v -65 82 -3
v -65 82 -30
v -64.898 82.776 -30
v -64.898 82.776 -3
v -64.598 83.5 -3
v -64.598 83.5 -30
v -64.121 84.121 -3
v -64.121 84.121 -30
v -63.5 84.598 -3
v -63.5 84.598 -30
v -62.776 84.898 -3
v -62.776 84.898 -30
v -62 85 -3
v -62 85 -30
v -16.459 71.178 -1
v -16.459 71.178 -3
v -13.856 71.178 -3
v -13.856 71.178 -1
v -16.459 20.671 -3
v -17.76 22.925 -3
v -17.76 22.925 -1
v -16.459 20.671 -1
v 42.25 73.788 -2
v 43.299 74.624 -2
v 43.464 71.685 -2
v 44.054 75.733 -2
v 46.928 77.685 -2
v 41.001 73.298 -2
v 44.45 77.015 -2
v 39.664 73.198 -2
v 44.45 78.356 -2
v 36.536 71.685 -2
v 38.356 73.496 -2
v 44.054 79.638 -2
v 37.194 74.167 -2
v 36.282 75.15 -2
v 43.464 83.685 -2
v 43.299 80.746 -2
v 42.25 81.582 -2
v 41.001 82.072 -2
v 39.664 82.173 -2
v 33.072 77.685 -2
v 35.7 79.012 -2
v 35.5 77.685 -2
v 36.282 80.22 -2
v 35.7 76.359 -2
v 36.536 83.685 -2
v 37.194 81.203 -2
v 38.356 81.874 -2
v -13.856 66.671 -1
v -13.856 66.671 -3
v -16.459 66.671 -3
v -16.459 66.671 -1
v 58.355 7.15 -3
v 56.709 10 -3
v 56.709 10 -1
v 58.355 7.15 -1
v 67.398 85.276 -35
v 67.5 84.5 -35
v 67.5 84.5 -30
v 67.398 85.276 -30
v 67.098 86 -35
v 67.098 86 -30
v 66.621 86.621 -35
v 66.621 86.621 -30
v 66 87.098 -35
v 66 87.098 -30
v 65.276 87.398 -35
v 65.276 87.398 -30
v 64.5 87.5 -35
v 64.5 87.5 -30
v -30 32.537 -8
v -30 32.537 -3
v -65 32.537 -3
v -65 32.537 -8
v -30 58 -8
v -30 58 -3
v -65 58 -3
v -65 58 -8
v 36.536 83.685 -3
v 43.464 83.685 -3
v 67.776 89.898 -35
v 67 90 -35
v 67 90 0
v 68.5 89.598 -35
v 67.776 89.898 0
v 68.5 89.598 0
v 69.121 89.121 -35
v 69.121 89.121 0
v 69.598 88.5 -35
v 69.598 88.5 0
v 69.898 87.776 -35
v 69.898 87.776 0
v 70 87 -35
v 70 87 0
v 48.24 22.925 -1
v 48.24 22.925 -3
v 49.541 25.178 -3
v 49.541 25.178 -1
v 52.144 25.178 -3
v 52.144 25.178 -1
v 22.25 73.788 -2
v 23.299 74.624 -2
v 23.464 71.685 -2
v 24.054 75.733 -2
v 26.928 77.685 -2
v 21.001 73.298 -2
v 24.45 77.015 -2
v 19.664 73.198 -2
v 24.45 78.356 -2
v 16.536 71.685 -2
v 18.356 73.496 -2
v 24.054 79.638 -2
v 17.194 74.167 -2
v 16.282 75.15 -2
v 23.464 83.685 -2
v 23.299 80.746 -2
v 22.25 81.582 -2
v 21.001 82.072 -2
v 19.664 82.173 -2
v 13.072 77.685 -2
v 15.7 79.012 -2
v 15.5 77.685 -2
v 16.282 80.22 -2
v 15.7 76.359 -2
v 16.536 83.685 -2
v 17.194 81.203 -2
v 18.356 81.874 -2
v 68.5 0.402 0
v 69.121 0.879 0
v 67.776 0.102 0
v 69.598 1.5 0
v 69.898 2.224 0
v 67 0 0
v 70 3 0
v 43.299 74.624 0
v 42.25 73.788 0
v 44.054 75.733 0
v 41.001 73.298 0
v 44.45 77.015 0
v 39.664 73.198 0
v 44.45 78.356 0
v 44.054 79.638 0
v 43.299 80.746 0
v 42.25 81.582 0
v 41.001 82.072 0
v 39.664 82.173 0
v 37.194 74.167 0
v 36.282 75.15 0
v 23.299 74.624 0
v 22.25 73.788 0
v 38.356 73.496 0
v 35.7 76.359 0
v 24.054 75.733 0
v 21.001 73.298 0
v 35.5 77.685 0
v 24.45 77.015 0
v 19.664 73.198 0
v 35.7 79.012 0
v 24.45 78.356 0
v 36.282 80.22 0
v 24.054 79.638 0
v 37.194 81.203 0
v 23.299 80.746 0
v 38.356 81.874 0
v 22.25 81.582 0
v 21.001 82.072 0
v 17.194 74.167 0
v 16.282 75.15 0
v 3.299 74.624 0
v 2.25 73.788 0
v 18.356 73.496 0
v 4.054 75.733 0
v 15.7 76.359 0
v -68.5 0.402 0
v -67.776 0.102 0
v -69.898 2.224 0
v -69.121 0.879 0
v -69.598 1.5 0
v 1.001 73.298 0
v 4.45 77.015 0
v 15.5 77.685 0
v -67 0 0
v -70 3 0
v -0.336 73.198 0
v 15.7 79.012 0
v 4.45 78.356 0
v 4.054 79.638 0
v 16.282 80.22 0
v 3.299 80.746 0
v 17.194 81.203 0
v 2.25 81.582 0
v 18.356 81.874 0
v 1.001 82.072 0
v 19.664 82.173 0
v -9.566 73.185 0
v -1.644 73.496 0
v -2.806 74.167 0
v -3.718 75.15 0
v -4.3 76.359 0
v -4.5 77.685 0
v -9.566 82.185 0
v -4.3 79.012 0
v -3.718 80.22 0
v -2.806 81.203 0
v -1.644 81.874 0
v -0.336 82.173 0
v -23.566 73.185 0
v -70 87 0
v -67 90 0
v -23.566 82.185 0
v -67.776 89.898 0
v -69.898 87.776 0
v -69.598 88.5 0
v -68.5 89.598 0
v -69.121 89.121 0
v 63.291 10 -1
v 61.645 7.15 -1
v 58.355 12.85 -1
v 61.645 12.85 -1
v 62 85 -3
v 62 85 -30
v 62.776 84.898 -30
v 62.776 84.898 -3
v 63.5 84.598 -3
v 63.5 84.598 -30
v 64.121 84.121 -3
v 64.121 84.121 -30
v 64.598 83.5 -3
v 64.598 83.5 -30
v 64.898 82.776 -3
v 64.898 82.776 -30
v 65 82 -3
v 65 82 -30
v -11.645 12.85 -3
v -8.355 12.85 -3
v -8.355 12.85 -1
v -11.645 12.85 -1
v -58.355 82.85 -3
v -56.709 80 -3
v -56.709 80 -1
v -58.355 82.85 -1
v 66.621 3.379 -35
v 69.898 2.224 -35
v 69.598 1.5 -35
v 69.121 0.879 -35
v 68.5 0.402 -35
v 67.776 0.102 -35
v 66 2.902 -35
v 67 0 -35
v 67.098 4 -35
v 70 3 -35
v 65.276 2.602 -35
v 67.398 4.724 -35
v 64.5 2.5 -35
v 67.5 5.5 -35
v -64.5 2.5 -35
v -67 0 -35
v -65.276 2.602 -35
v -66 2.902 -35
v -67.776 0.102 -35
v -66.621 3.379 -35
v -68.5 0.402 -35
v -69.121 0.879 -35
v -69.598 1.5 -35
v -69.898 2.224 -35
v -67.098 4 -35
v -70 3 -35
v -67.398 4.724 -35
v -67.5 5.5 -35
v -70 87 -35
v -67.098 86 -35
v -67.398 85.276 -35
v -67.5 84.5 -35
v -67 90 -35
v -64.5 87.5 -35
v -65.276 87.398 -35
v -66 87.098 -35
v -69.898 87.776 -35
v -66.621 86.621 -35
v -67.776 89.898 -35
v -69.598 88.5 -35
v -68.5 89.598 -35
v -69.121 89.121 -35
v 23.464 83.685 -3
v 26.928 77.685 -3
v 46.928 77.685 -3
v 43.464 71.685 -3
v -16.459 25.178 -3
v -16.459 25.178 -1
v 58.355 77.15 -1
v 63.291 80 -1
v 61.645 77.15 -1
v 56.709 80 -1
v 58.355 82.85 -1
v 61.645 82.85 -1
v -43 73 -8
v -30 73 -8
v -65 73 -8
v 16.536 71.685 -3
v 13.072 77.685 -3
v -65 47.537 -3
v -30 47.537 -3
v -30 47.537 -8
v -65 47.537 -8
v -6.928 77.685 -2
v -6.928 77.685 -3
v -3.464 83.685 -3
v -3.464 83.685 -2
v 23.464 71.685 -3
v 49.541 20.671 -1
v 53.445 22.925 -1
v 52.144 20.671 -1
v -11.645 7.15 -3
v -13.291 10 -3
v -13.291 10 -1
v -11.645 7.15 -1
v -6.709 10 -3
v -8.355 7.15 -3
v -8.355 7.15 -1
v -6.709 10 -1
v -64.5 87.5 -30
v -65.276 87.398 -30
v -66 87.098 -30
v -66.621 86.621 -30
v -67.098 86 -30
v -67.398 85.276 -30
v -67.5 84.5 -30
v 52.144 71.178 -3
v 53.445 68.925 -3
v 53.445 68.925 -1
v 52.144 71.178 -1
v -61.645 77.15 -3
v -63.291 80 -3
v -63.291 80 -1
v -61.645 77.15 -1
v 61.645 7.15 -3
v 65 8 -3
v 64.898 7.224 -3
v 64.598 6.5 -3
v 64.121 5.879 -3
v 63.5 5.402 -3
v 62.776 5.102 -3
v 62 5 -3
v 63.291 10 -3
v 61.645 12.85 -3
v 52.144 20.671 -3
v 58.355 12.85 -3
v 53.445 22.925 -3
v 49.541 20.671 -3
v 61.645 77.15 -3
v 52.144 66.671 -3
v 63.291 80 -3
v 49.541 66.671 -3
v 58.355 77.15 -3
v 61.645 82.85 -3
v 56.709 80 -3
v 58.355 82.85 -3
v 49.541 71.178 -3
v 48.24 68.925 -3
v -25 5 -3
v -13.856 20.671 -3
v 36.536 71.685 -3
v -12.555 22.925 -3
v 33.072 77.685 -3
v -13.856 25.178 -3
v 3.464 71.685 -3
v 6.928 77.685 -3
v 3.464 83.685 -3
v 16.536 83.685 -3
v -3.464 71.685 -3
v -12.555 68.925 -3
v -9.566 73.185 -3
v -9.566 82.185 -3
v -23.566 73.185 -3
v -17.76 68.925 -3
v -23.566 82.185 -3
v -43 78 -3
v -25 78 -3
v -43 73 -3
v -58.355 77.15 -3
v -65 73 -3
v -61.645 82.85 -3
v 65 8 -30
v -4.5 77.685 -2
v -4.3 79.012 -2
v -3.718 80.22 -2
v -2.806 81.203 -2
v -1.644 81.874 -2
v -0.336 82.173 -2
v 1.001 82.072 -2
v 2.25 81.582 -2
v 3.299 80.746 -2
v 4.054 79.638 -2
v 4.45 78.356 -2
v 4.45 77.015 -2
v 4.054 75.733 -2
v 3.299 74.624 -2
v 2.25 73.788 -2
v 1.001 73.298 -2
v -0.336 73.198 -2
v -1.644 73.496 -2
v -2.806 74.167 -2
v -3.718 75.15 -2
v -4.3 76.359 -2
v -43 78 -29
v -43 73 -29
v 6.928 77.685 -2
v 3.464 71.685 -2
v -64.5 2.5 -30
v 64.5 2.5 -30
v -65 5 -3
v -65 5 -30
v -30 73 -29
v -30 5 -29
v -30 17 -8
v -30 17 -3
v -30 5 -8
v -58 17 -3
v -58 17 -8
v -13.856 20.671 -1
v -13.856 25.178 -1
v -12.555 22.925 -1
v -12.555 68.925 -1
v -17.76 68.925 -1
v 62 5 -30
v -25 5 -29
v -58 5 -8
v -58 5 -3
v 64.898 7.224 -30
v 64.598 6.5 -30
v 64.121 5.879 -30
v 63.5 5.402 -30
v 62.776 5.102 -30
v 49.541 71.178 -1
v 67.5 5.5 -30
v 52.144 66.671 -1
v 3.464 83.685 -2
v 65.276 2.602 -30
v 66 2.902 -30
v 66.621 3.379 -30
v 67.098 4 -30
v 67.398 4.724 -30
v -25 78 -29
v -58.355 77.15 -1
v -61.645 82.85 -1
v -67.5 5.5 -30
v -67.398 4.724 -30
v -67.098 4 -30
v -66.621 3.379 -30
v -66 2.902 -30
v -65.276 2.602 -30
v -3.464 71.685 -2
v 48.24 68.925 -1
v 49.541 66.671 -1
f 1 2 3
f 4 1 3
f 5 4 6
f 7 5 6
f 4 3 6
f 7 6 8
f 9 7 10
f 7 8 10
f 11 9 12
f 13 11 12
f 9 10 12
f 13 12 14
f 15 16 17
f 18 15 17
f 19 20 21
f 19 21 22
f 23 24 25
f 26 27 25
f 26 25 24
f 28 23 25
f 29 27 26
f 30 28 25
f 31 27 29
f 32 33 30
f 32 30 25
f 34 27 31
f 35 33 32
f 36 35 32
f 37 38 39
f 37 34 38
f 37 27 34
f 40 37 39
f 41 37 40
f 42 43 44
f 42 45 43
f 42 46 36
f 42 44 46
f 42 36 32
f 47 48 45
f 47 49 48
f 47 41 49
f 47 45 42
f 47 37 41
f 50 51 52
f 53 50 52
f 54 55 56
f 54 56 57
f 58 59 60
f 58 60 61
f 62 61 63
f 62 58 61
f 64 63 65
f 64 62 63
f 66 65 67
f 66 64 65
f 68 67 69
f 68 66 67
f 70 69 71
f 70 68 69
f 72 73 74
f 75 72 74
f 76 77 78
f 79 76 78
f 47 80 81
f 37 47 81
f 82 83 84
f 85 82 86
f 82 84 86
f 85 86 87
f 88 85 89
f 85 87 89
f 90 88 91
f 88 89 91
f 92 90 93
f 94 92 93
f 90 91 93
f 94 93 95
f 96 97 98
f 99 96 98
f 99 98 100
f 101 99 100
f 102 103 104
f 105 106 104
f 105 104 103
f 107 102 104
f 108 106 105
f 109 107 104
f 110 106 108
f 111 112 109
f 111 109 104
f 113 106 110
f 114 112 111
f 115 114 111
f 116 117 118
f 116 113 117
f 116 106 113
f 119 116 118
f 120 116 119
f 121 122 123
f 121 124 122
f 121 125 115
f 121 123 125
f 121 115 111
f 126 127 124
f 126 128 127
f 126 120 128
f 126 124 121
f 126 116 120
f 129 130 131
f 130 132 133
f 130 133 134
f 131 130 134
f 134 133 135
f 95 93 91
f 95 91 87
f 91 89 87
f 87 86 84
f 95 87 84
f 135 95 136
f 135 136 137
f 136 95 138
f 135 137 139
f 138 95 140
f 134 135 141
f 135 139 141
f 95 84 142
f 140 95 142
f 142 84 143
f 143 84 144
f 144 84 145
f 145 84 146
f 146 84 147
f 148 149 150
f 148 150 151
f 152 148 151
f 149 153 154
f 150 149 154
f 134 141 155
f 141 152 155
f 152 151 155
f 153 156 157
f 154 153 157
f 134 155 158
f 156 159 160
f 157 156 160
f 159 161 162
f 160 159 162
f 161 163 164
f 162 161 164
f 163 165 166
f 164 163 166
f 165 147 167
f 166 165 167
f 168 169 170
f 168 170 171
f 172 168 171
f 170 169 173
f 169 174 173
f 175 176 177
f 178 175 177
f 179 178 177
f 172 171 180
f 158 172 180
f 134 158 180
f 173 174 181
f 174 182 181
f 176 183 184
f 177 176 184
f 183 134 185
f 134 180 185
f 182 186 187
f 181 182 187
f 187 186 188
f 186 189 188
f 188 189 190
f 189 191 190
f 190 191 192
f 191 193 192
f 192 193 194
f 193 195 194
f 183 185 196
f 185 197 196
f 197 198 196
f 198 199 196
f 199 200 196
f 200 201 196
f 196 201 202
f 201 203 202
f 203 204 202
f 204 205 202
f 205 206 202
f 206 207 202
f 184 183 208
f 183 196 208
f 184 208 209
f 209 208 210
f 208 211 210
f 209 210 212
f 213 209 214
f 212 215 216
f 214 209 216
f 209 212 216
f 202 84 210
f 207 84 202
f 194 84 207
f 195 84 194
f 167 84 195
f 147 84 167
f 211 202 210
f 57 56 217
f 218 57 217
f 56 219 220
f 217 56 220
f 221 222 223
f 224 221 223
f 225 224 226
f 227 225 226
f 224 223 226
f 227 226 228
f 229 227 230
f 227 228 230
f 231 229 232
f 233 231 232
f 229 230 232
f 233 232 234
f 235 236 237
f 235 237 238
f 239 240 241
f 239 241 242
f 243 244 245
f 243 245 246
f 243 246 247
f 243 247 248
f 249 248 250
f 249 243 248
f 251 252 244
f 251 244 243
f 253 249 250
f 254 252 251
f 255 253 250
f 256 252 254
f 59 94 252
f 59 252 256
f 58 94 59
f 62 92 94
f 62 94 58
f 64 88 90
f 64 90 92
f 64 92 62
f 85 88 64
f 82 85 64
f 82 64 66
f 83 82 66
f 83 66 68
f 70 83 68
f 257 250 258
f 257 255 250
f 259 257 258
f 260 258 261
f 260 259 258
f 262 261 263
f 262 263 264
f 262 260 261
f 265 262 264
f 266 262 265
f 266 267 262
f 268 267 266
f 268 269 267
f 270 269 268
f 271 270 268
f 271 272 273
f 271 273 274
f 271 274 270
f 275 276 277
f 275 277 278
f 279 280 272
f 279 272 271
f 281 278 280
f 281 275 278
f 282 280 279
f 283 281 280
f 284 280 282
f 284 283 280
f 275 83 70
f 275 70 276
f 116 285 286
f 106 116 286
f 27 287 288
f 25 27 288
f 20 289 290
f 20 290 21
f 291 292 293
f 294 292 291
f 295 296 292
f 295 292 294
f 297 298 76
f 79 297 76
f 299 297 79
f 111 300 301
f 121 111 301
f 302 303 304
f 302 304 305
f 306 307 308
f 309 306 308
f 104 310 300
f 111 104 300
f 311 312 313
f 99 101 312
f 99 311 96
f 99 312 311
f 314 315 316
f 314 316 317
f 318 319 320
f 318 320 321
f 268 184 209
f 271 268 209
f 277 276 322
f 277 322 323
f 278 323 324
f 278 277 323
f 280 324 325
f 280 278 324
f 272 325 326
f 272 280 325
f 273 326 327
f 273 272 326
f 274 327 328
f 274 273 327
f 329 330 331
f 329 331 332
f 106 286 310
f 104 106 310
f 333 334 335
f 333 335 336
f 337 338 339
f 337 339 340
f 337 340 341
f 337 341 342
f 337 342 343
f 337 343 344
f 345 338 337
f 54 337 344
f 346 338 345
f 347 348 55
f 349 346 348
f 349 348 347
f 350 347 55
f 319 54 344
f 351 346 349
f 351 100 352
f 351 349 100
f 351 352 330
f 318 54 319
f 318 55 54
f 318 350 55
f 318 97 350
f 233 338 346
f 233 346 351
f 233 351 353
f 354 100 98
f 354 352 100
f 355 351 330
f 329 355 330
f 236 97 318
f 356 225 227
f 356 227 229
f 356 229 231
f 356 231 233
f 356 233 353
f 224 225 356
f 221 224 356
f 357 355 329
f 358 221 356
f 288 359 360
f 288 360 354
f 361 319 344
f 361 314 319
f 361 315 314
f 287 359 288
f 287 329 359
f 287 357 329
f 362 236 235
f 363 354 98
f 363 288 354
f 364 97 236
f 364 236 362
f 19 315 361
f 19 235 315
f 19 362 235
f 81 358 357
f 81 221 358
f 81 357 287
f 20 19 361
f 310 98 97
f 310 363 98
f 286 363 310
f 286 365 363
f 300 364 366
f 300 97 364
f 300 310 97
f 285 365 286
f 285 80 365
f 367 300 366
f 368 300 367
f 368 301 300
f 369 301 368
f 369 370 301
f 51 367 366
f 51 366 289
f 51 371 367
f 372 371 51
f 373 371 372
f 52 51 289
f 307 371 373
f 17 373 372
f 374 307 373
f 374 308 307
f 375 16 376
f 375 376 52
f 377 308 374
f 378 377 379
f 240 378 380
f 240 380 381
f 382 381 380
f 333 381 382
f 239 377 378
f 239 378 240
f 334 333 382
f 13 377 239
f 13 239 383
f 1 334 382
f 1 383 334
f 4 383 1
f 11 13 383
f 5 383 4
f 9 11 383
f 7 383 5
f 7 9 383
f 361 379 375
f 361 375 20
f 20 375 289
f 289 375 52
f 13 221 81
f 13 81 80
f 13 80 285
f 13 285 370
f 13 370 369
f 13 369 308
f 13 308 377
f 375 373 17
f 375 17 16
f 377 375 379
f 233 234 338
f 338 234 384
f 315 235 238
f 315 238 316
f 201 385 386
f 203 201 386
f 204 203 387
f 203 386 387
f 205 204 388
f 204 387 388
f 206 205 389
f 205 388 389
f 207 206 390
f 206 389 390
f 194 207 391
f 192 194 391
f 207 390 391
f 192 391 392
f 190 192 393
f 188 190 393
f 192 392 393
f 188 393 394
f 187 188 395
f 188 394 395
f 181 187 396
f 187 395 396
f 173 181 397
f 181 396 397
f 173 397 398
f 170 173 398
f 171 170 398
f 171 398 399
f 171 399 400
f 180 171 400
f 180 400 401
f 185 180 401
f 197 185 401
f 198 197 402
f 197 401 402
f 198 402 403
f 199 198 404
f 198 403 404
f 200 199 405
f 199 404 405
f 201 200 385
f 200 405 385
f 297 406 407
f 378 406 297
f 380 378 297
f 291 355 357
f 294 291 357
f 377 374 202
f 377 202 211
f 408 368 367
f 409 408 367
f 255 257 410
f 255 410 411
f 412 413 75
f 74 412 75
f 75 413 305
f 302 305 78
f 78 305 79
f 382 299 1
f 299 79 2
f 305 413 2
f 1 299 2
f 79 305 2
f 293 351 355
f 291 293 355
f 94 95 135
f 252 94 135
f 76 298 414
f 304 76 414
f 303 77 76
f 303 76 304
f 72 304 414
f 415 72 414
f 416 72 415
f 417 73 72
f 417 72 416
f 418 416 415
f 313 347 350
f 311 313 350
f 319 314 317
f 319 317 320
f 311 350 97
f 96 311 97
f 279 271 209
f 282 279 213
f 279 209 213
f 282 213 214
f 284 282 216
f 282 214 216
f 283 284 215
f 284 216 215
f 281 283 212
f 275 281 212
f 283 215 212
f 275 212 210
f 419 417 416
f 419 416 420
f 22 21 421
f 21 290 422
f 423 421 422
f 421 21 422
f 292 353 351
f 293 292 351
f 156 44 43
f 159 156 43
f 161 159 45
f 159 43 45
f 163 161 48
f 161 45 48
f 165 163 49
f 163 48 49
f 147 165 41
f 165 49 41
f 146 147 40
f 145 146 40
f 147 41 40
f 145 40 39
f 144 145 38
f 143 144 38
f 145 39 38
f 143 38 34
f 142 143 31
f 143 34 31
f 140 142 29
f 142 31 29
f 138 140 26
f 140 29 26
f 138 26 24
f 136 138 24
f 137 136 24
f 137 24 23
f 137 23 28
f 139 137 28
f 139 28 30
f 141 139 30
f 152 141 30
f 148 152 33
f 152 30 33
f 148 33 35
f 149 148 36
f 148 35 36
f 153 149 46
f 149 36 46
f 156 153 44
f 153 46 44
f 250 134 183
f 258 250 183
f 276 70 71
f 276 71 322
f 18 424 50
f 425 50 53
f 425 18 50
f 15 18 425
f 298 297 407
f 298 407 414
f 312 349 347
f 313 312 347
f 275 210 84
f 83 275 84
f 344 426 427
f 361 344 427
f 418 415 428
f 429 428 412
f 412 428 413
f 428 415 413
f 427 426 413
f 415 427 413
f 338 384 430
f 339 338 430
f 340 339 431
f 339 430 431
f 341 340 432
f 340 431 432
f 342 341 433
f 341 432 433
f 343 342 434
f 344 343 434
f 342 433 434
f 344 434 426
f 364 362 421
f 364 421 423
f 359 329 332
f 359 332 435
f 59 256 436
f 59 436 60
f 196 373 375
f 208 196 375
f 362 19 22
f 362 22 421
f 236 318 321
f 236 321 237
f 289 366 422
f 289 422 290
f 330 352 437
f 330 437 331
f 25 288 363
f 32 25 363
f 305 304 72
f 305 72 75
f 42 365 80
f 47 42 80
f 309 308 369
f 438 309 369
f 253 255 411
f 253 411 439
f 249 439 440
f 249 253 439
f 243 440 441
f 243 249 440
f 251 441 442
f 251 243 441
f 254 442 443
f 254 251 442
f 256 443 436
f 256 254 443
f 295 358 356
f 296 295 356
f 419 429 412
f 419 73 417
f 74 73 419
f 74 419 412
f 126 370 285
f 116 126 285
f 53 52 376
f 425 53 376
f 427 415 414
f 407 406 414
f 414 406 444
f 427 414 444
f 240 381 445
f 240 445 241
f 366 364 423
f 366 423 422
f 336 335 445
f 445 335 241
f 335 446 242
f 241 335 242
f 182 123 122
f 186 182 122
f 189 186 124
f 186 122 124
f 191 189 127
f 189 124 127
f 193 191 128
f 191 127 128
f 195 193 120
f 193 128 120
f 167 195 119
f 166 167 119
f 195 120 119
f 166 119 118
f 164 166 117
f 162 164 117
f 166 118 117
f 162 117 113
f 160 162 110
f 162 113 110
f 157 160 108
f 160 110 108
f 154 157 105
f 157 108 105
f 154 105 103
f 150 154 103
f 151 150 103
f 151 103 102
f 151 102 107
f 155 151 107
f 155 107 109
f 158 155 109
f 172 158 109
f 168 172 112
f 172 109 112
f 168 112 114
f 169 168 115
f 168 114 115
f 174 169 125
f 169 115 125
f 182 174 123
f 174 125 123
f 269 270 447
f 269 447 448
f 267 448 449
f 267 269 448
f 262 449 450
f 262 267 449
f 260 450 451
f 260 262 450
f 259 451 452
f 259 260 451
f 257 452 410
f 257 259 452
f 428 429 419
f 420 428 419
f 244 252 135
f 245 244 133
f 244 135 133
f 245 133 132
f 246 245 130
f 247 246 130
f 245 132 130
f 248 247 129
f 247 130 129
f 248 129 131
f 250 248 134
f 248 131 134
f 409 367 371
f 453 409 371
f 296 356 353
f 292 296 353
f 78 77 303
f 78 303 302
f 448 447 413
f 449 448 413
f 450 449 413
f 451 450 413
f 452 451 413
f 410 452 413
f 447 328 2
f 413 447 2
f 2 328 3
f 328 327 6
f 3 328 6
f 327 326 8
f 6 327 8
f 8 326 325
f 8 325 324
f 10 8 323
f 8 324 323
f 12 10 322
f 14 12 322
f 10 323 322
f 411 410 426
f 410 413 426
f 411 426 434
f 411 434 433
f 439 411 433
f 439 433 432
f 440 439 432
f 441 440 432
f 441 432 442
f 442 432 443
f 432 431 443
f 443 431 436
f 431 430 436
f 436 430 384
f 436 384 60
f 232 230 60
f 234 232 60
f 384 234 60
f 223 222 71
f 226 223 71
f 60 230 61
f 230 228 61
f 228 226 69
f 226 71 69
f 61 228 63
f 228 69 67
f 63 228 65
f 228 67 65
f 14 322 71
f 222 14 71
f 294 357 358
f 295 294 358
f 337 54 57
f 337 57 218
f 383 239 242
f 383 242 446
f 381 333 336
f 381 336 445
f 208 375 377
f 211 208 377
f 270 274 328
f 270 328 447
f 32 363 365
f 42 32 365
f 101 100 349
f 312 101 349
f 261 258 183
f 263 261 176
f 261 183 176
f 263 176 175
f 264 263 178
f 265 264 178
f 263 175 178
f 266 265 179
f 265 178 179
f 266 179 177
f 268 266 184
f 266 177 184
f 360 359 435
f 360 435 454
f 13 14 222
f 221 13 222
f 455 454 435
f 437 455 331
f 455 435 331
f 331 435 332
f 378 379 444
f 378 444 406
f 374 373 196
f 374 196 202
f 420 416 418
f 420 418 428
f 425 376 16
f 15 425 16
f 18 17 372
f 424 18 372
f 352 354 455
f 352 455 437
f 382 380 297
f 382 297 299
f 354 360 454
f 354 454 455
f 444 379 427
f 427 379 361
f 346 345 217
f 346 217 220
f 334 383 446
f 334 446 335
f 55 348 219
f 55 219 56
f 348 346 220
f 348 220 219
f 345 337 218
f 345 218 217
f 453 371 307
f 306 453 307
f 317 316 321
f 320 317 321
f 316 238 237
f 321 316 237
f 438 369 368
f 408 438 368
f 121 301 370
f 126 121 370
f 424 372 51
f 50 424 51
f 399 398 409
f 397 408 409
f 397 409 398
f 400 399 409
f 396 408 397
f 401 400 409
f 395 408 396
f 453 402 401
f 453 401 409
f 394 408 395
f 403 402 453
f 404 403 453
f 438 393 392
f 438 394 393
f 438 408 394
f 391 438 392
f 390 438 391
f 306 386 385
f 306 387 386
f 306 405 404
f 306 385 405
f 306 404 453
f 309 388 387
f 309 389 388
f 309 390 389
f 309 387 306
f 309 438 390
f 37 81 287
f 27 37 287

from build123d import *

# Parameters (mm, degrees)
EXTRUDE_2_DEPTH     = 35
CUT_EXTRUDE_3_DEPTH = 5
CUT_EXTRUDE_4_DEPTH = 27
CUT_EXTRUDE_5_DEPTH = 2
CUT_EXTRUDE_6_DEPTH = 1
SKETCH_10_R         = 4.5
CUT_EXTRUDE_7_DEPTH = 2
SKETCH_11_W         = 35
SKETCH_11_H         = 15
SKETCH_11_W_2       = 28
SKETCH_11_H_2       = 12
EXTRUDE_3_DEPTH     = 5
EXTRUDE_5_DEPTH     = 26
SKETCH_13_W         = 14
SKETCH_13_H         = 9
CUT_EXTRUDE_8_DEPTH = 3


with BuildPart() as part:
    # 草图4 → 凸台-拉伸2 (new body)
    with BuildSketch(Plane.XY):
        with BuildLine():
            Line((67, 0), (-67, 0))
            ThreePointArc((-67, 0), (-69.121320344, 0.878679656), (-70, 3))
            Line((-70, 3), (-70, 87))
            ThreePointArc((-70, 87), (-69.121320344, 89.121320344), (-67, 90))
            Line((-67, 90), (67, 90))
            ThreePointArc((67, 90), (69.121320344, 89.121320344), (70, 87))
            Line((70, 87), (70, 3))
            ThreePointArc((70, 3), (69.121320344, 0.878679656), (67, 0))
        make_face()
    extrude(amount=-EXTRUDE_2_DEPTH)

    # 草图5 → 切除-拉伸3 (cut)
    with BuildSketch(Plane(origin=(0, 0, -35), x_dir=(-1, 0, 0), z_dir=(0, 0, -1))):
        with BuildLine():
            Line((-64.5, 87.5), (64.5, 87.5))
            ThreePointArc((64.5, 87.5), (66.621320344, 86.621320344), (67.5, 84.5))
            Line((67.5, 84.5), (67.5, 5.5))
            ThreePointArc((67.5, 5.5), (66.621320344, 3.378679656), (64.5, 2.5))
            Line((64.5, 2.5), (-64.5, 2.5))
            ThreePointArc((-64.5, 2.5), (-66.621320344, 3.378679656), (-67.5, 5.5))
            Line((-67.5, 5.5), (-67.5, 84.5))
            ThreePointArc((-67.5, 84.5), (-66.621320344, 86.621320344), (-64.5, 87.5))
        make_face()
    extrude(amount=-CUT_EXTRUDE_3_DEPTH, mode=Mode.SUBTRACT)

    # 草图7 → 切除-拉伸4 (cut)
    with BuildSketch(Plane(origin=(0, 0, -30), x_dir=(-1, 0, 0), z_dir=(0, 0, -1))):
        with BuildLine():
            Line((62, 5), (65, 5))
            Line((65, 5), (65, 8))
            Line((65, 8), (65, 82))
            ThreePointArc((65, 82), (64.121320344, 84.121320344), (62, 85))
            Line((62, 85), (-62, 85))
            ThreePointArc((-62, 85), (-64.121320344, 84.121320344), (-65, 82))
            Line((-65, 82), (-65, 8))
            ThreePointArc((-65, 8), (-64.121320344, 5.878679656), (-62, 5))
            Line((-62, 5), (62, 5))
        make_face()
    extrude(amount=-CUT_EXTRUDE_4_DEPTH, mode=Mode.SUBTRACT)

    # 草图8 → 切除-拉伸5 (cut)
    with BuildSketch(Plane(origin=(0, 0, -3), x_dir=(-1, 0, 0), z_dir=(0, 0, -1))):
        Polygon((-58.354551733, 12.85), (-56.709103466, 10), (-58.354551733, 7.15), (-61.645448267, 7.15), (-63.290896534, 10), (-61.645448267, 12.85), align=None)
        Polygon((-56.709103466, 80), (-58.354551733, 82.85), (-61.645448267, 82.85), (-63.290896534, 80), (-61.645448267, 77.15), (-58.354551733, 77.15), align=None)
        Polygon((17.760008931, 68.924519398), (16.458678386, 71.17849002), (13.856017295, 71.17849002), (12.554686749, 68.924519398), (13.856017295, 66.670548775), (16.458678386, 66.670548775), align=None)
        Polygon((-52.143982702, 66.670548775), (-53.445313247, 68.924519398), (-52.143982702, 71.17849002), (-49.541321611, 71.17849002), (-48.239991065, 68.924519398), (-49.541321611, 66.670548775), align=None)
        Polygon((58.354551733, 77.15), (56.709103466, 80), (58.354551733, 82.85), (61.645448267, 82.85), (63.290896534, 80), (61.645448267, 77.15), align=None)
        Polygon((8.354551733, 7.15), (6.709103466, 10), (8.354551733, 12.85), (11.645448267, 12.85), (13.290896534, 10), (11.645448267, 7.15), align=None)
        Polygon((-49.541321611, 25.17849002), (-52.143982702, 25.17849002), (-53.445313247, 22.924519398), (-52.143982702, 20.670548775), (-49.541321611, 20.670548775), (-48.239991065, 22.924519398), align=None)
        Polygon((16.458678386, 25.17849002), (17.760008931, 22.924519398), (16.458678386, 20.670548775), (13.856017295, 20.670548775), (12.554686749, 22.924519398), (13.856017295, 25.17849002), align=None)
    extrude(amount=-CUT_EXTRUDE_5_DEPTH, mode=Mode.SUBTRACT)

    # 草图9 → 切除-拉伸6 (cut)
    with BuildSketch(Plane(origin=(0, 0, -3), x_dir=(-1, 0, 0), z_dir=(0, 0, -1))):
        Polygon((-13.07179677, 77.685248672), (-16.535898385, 83.685248672), (-23.464101615, 83.685248672), (-26.92820323, 77.685248672), (-23.464101615, 71.685248672), (-16.535898385, 71.685248672), align=None)
        Polygon((-33.07179677, 77.685248672), (-36.535898385, 83.685248672), (-43.464101615, 83.685248672), (-46.92820323, 77.685248672), (-43.464101615, 71.685248672), (-36.535898385, 71.685248672), align=None)
        Polygon((6.92820323, 77.685248672), (3.464101615, 83.685248672), (-3.464101615, 83.685248672), (-6.92820323, 77.685248672), (-3.464101615, 71.685248672), (3.464101615, 71.685248672), align=None)
    extrude(amount=-CUT_EXTRUDE_6_DEPTH, mode=Mode.SUBTRACT)

    # 草图10 → 切除-拉伸7 (cut)
    with BuildSketch(Plane(origin=(0, 0, -2), x_dir=(-1, 0, 0), z_dir=(0, 0, -1))):
        with Locations((-40, 77.685248672)):
            Circle(SKETCH_10_R)
        with Locations((-20, 77.685248672)):
            Circle(SKETCH_10_R)
        with Locations((0, 77.685248672)):
            Circle(SKETCH_10_R)
    extrude(amount=-CUT_EXTRUDE_7_DEPTH, mode=Mode.SUBTRACT)

    # 草图11 → 凸台-拉伸3 (add)
    with BuildSketch(Plane(origin=(0, 0, -3), x_dir=(-1, 0, 0), z_dir=(0, 0, -1))):
        with Locations((47.5, 65.5)):
            Rectangle(SKETCH_11_W, SKETCH_11_H)
        with Locations((44, 11)):
            Rectangle(SKETCH_11_W_2, SKETCH_11_H_2)
        with Locations((47.5, 40.037281602)):
            Rectangle(SKETCH_11_W, SKETCH_11_H)
    extrude(amount=EXTRUDE_3_DEPTH)

    # 草图12 → 凸台-拉伸5 (add)
    with BuildSketch(Plane(origin=(0, 0, -3), x_dir=(-1, 0, 0), z_dir=(0, 0, -1))):
        Polygon((30, 73), (30, 5), (25, 5), (25, 73), (25, 78), (43, 78), (43, 73), align=None)
    extrude(amount=EXTRUDE_5_DEPTH)

    # 草图13 → 切除-拉伸8 (cut)
    with BuildSketch(Plane(origin=(0, 0, -3), x_dir=(-1, 0, 0), z_dir=(0, 0, -1))):
        with Locations((16.566160231, 77.685248672)):
            Rectangle(SKETCH_13_W, SKETCH_13_H)
    extrude(amount=-CUT_EXTRUDE_8_DEPTH, mode=Mode.SUBTRACT)


solid = part.part
